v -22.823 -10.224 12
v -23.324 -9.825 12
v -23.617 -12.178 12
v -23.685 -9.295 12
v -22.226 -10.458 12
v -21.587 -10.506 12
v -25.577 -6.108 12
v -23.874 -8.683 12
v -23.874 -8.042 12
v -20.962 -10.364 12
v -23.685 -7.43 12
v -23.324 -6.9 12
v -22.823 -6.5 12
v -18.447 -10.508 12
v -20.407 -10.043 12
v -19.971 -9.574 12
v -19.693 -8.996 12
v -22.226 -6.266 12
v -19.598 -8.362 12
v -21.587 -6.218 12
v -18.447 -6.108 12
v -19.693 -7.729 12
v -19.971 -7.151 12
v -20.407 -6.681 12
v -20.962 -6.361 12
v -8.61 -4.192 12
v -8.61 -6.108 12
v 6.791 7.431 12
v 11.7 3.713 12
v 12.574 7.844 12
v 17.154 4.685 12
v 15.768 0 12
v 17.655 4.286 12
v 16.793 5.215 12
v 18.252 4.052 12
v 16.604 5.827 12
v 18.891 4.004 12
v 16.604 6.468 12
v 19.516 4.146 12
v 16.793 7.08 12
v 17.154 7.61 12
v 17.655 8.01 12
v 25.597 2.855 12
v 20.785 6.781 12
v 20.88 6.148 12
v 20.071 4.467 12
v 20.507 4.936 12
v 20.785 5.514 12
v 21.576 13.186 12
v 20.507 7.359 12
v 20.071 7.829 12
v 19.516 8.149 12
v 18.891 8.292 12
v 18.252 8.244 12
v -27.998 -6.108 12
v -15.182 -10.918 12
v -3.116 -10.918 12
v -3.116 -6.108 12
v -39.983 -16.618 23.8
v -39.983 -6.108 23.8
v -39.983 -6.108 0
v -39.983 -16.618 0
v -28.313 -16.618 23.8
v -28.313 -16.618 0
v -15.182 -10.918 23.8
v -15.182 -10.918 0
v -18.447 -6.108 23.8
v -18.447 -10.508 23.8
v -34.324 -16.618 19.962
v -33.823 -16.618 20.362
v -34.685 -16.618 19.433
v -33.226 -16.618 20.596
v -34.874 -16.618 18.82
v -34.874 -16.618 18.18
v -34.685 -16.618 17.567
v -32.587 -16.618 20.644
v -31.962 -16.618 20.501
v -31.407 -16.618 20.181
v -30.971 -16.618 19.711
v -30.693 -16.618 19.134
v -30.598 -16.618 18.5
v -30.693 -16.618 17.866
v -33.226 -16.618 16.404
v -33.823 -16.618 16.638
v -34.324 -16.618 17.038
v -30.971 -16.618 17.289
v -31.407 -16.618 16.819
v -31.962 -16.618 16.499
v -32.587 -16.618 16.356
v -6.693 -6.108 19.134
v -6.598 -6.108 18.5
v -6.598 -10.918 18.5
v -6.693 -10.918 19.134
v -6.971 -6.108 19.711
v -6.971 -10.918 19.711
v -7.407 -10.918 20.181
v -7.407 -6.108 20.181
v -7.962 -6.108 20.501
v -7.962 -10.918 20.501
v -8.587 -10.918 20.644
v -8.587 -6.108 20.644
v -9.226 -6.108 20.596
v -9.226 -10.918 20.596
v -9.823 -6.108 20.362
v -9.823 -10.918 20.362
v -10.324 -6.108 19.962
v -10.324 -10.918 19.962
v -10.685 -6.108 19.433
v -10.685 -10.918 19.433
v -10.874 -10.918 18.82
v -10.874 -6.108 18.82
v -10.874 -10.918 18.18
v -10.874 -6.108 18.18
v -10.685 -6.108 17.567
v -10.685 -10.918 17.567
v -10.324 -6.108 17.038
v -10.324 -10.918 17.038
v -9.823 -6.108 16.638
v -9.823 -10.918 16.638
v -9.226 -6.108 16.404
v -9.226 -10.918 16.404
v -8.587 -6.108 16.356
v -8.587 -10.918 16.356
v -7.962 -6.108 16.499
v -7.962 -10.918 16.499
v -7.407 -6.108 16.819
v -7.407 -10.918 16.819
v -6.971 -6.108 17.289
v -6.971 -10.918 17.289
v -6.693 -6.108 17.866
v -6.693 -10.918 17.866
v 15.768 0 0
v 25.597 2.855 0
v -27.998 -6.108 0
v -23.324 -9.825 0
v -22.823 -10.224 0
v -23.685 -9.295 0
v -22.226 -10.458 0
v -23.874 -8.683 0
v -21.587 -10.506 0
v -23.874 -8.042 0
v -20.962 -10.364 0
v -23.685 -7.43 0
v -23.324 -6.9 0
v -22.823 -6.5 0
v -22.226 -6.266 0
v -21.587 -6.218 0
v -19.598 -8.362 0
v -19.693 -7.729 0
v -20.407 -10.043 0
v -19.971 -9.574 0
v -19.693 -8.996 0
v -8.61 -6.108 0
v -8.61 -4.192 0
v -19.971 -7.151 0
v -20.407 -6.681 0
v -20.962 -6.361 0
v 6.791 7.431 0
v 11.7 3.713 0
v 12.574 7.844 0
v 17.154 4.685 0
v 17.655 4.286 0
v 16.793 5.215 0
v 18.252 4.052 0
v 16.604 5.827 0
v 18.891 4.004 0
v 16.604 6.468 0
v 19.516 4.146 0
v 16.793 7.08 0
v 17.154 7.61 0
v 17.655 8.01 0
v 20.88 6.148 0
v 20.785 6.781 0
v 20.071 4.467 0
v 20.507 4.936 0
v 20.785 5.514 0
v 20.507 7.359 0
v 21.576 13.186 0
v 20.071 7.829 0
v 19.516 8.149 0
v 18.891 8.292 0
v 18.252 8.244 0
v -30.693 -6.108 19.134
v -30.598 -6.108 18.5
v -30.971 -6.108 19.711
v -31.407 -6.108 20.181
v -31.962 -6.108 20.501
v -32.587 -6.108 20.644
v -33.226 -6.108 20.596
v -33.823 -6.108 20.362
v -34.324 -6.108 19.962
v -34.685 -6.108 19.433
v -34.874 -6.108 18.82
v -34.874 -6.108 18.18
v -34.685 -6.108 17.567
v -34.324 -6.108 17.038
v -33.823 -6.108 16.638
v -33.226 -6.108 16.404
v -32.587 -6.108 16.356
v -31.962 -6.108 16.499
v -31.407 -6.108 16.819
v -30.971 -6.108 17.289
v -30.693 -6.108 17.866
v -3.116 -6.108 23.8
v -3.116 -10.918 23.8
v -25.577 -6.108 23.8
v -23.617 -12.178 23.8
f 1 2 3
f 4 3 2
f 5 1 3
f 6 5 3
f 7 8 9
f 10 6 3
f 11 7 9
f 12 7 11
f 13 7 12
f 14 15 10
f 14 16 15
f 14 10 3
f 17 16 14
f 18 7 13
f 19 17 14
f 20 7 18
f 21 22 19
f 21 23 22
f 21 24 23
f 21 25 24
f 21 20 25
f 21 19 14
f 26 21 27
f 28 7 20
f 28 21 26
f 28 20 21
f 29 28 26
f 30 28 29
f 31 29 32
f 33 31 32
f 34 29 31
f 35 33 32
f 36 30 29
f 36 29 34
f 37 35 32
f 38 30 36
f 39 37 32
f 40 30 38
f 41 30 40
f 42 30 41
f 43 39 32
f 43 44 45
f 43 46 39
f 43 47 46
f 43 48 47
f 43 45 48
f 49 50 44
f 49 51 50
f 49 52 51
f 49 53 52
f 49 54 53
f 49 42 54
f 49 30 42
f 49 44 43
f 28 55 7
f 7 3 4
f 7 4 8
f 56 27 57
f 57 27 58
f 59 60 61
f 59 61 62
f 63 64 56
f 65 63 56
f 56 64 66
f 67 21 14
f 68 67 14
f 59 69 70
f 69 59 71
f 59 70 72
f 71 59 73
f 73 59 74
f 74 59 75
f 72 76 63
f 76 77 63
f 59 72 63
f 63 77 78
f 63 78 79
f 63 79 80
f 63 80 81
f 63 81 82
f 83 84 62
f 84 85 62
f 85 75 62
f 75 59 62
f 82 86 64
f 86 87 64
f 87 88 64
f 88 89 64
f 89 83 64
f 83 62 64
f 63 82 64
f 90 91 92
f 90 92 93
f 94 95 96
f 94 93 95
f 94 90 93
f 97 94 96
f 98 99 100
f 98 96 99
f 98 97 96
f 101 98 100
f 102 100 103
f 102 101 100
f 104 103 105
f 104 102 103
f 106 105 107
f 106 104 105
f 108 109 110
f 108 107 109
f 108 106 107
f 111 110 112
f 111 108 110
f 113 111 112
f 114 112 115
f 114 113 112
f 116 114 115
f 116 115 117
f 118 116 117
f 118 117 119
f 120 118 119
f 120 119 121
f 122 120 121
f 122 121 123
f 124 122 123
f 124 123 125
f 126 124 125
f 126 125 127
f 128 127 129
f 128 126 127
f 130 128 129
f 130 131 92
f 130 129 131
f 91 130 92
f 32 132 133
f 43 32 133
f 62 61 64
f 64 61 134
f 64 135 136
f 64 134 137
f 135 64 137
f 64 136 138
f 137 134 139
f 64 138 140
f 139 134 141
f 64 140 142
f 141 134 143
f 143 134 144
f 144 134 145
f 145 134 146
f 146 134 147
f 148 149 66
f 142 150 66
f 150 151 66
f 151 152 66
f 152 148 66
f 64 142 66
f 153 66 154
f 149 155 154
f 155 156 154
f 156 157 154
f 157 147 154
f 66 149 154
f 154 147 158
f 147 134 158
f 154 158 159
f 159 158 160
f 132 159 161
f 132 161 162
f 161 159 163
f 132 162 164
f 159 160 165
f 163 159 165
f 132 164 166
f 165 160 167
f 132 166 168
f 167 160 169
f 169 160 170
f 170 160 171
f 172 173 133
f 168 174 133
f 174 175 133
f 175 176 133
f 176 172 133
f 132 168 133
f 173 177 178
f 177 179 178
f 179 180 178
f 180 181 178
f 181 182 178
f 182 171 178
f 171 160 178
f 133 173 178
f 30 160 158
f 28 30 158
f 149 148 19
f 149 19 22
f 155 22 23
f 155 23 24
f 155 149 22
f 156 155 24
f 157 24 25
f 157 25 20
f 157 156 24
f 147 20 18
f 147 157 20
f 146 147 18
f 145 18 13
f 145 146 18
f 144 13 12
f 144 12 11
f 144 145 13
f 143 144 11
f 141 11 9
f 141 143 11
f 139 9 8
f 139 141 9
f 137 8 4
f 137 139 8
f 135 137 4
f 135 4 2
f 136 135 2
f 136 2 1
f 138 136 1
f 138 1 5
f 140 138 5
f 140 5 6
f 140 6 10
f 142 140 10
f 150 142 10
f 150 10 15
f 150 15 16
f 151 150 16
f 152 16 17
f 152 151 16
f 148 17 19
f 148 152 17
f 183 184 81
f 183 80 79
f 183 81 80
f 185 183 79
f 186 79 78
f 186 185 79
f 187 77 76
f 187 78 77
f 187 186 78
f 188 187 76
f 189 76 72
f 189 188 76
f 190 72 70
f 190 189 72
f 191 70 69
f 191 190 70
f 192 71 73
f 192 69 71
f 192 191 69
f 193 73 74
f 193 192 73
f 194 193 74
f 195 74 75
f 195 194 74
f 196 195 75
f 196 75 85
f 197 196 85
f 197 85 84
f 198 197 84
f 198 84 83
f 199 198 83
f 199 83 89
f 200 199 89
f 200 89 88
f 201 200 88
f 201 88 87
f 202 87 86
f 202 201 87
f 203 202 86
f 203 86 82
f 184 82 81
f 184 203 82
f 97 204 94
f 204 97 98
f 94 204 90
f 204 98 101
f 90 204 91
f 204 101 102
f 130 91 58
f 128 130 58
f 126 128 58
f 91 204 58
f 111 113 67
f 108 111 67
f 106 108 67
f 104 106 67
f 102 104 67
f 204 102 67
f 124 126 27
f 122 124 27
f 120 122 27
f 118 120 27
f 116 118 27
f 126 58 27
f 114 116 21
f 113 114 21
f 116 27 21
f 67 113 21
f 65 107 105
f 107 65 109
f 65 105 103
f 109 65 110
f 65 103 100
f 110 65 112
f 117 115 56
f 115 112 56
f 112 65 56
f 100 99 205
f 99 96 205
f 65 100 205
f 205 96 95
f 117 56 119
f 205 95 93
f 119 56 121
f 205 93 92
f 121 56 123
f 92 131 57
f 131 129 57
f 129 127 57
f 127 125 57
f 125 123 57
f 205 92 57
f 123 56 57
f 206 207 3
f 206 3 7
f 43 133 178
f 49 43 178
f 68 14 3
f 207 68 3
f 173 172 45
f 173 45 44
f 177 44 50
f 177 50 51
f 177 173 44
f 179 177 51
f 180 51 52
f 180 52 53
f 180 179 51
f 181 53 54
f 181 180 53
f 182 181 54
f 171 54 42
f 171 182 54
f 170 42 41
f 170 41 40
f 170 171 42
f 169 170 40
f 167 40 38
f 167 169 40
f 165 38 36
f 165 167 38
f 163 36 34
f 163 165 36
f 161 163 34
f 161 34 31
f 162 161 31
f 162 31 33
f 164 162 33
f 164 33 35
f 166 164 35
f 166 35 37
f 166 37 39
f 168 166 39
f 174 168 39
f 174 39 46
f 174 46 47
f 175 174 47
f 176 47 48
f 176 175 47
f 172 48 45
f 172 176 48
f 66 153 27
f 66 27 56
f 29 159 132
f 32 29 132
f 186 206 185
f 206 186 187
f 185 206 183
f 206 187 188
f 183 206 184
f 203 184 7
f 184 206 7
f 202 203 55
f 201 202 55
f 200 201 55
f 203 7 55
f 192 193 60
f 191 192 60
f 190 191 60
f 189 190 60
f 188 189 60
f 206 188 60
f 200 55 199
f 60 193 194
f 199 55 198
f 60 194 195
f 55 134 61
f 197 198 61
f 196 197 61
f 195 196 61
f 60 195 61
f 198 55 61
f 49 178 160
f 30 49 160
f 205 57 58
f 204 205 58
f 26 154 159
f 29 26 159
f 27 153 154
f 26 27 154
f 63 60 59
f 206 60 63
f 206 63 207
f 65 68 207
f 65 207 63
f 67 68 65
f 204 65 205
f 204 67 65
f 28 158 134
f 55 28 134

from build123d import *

# Parameters (mm, degrees)
F2_DEPTH  = 23.8
F2_FACE_W = 11.670614
F2_FACE_H = 23.8
F1_R      = 2.15
F3_DEPTH  = 25
F0_R      = 2.15
F4_DEPTH  = 12
F5_DEPTH  = 12


with BuildPart() as f2:
    # F0 (on Top) → F2 (new body)
    with BuildSketch(Plane.XY):
        Polygon((-27.997939, -6.107914), (-28.312882, -16.618271), (-15.182475, -10.918183), (-8.610408, -6.107914), (-18.446828, -6.107914), (-18.446828, -10.508162), (-23.616951, -12.177606), (-25.576867, -6.107914), align=None)
        Polygon((-8.610408, -6.107914), (-15.182475, -10.918183), (-3.116295, -10.918183), (-3.116295, -6.107914), align=None)
        Polygon((-39.983496, -6.107914), (-39.983496, -16.618271), (-28.312882, -16.618271), (-27.997939, -6.107914), align=None)
    extrude(amount=F2_DEPTH)

    # F2_face (on face) + F1 (on Front) → F3 (cut)
    with BuildSketch(Plane(origin=(-34.148189, -16.618271, 11.9), x_dir=(1, 0, 0), z_dir=(0, -1, 0))):
        Rectangle(F2_FACE_W, F2_FACE_H)
    with BuildSketch(Plane.XZ):
        with Locations((-32.747678, 18.5)):
            Circle(F1_R)
        with Locations((-8.747678, 18.5)):
            Circle(F1_R)
    extrude(amount=F3_DEPTH, mode=Mode.SUBTRACT)

    # F0 (on Top) → F4 (join)
    with BuildSketch(Plane.XY):
        Polygon((6.790542, 7.431474), (-27.997939, -6.107914), (-25.576867, -6.107914), (-18.446828, -6.107914), (-8.610408, -6.107914), (-8.610408, -4.192226), (11.700466, 3.712598), (15.768237, 0), (25.596975, 2.855423), (21.576397, 13.186007), (12.574072, 7.844407), align=None)
        with Locations((18.730204, 6.14762)):
            Circle(F0_R, mode=Mode.SUBTRACT)
        Polygon((-18.446828, -6.107914), (-25.576867, -6.107914), (-23.616951, -12.177606), (-18.446828, -10.508162), align=None)
        with Locations((-21.747678, -8.362398)):
            Circle(F0_R, mode=Mode.SUBTRACT)
    extrude(amount=F4_DEPTH)

    # F0 (on Top) → F5 (cut)
    with BuildSketch(Plane.XY):
        Polygon((-8.610408, -6.107914), (-15.182475, -10.918183), (-3.116295, -10.918183), (-3.116295, -6.107914), align=None)
    extrude(amount=F5_DEPTH, mode=Mode.SUBTRACT)


solid = f2.part
